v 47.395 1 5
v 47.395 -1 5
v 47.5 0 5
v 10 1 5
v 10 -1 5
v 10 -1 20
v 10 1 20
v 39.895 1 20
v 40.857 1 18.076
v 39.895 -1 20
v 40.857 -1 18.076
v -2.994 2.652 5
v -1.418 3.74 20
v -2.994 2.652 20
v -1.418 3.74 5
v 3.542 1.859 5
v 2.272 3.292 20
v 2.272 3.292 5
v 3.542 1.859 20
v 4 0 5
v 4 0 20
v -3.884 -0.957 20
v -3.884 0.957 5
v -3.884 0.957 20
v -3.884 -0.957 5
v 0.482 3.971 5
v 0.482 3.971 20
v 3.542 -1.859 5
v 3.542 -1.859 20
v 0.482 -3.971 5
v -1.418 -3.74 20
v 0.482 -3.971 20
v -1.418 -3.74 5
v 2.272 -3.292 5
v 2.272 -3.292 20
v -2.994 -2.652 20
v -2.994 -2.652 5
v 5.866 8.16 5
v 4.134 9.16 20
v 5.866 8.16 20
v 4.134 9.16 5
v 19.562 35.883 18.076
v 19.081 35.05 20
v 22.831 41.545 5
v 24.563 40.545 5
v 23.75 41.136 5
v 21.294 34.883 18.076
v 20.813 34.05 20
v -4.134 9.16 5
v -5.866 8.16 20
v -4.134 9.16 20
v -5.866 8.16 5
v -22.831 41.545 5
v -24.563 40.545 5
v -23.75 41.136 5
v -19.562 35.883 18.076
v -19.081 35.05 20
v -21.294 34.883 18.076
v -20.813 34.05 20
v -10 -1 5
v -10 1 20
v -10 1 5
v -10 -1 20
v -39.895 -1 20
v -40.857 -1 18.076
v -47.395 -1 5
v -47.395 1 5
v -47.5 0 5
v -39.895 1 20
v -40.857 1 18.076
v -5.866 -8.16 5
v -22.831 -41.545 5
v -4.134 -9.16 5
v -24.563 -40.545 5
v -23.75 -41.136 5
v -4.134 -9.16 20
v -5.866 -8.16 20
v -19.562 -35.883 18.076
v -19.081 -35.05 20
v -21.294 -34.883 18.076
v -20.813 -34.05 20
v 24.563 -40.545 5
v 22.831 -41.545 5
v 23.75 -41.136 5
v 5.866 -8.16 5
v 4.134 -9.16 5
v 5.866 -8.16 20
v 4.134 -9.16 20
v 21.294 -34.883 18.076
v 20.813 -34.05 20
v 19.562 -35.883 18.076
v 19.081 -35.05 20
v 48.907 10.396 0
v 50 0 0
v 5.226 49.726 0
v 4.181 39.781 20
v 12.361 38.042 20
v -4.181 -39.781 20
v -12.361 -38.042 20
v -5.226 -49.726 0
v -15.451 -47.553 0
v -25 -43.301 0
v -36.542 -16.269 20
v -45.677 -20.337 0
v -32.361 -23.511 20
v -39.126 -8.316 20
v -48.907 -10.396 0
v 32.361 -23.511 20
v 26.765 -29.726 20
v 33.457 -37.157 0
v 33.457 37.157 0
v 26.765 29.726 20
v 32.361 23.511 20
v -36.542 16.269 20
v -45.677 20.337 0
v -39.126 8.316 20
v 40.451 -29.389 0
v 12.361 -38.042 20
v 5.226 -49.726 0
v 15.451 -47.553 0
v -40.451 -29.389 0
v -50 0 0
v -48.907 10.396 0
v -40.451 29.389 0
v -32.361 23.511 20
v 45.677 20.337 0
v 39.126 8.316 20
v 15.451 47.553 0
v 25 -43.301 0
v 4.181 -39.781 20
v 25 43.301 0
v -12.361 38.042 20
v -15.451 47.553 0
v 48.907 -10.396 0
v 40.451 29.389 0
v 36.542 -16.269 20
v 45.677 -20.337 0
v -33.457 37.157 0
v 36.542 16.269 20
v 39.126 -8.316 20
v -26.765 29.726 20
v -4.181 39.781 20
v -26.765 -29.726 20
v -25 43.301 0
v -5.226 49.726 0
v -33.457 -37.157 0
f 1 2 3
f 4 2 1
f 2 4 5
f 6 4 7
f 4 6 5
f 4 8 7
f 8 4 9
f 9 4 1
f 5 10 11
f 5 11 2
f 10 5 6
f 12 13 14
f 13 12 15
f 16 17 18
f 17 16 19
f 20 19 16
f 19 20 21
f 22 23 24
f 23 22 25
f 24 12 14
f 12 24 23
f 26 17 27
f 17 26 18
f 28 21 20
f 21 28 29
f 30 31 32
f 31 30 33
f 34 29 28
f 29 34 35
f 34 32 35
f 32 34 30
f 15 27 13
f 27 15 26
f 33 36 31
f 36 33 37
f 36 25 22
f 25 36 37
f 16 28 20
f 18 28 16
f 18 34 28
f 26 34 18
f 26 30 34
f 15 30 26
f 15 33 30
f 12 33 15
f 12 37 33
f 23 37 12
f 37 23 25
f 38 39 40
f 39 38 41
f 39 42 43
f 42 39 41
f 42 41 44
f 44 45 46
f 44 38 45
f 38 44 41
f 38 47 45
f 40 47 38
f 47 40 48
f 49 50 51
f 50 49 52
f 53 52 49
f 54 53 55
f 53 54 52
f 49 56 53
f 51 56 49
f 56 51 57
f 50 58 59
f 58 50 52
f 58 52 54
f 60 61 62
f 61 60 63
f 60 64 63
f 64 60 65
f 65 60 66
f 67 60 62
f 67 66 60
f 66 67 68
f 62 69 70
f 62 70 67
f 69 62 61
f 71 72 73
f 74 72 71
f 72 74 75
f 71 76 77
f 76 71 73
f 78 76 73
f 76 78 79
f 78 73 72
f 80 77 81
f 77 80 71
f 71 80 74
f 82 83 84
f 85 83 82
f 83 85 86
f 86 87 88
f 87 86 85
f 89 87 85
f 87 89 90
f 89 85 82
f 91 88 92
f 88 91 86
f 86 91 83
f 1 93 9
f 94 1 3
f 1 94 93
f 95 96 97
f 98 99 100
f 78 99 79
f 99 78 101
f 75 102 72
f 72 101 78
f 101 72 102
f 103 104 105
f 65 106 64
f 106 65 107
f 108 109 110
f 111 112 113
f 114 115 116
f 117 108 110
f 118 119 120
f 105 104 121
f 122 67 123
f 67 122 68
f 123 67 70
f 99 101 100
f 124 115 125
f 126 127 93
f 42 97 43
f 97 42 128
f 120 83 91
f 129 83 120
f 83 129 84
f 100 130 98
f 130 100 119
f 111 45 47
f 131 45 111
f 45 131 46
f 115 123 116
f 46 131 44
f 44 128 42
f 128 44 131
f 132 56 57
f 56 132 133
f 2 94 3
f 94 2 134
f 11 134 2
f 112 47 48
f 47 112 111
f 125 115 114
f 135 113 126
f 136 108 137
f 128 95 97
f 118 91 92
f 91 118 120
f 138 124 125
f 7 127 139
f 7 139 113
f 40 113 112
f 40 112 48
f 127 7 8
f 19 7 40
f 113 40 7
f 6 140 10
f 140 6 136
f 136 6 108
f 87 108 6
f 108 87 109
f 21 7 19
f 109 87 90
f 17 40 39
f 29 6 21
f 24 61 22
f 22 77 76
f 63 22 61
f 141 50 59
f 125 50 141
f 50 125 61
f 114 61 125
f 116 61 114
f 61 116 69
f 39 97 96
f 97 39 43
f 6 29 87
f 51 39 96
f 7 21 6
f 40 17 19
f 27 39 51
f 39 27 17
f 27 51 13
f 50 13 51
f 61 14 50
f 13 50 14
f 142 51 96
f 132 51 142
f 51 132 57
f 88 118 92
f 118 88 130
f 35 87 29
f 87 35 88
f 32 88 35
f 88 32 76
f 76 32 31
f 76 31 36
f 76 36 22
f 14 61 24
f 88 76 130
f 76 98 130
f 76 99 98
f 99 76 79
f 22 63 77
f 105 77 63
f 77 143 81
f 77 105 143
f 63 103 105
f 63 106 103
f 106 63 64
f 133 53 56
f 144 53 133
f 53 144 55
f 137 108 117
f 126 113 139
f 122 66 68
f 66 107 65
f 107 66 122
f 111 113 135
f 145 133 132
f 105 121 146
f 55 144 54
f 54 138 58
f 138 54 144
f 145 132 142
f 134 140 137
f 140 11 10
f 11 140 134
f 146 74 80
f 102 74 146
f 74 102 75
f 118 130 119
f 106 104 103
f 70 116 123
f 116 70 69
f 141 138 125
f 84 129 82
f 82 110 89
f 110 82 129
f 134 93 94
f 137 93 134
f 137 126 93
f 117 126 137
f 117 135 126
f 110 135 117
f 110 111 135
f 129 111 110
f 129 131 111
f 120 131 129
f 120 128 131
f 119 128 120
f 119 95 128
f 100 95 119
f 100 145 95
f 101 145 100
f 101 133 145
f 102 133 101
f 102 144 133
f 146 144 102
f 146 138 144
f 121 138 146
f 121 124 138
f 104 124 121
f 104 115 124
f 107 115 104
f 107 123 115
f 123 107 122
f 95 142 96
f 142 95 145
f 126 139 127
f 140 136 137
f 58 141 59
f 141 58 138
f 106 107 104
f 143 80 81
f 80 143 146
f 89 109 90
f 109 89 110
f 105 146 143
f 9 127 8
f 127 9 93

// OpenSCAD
//Number of records slots in base *MAX OF 10*
numRecords=6;
//Smooth Rod Diameter 
rodDiameter=8;

module bottom(){
cylinder(r1=50, r2=40, h=20);

}
module base()
{
if (numRecords>10)
{
echo("Please choose a number less than 10");
}
else{
difference()
{
bottom();
for (x= [0:360/numRecords:360])
{ 
rotate([0,0,x]) translate([30,0,17.5]) cube([40,2,25],center=true);
translate([0,0,5])cylinder(r=rodDiameter/2, h=125);
}
}
}
}

base();
